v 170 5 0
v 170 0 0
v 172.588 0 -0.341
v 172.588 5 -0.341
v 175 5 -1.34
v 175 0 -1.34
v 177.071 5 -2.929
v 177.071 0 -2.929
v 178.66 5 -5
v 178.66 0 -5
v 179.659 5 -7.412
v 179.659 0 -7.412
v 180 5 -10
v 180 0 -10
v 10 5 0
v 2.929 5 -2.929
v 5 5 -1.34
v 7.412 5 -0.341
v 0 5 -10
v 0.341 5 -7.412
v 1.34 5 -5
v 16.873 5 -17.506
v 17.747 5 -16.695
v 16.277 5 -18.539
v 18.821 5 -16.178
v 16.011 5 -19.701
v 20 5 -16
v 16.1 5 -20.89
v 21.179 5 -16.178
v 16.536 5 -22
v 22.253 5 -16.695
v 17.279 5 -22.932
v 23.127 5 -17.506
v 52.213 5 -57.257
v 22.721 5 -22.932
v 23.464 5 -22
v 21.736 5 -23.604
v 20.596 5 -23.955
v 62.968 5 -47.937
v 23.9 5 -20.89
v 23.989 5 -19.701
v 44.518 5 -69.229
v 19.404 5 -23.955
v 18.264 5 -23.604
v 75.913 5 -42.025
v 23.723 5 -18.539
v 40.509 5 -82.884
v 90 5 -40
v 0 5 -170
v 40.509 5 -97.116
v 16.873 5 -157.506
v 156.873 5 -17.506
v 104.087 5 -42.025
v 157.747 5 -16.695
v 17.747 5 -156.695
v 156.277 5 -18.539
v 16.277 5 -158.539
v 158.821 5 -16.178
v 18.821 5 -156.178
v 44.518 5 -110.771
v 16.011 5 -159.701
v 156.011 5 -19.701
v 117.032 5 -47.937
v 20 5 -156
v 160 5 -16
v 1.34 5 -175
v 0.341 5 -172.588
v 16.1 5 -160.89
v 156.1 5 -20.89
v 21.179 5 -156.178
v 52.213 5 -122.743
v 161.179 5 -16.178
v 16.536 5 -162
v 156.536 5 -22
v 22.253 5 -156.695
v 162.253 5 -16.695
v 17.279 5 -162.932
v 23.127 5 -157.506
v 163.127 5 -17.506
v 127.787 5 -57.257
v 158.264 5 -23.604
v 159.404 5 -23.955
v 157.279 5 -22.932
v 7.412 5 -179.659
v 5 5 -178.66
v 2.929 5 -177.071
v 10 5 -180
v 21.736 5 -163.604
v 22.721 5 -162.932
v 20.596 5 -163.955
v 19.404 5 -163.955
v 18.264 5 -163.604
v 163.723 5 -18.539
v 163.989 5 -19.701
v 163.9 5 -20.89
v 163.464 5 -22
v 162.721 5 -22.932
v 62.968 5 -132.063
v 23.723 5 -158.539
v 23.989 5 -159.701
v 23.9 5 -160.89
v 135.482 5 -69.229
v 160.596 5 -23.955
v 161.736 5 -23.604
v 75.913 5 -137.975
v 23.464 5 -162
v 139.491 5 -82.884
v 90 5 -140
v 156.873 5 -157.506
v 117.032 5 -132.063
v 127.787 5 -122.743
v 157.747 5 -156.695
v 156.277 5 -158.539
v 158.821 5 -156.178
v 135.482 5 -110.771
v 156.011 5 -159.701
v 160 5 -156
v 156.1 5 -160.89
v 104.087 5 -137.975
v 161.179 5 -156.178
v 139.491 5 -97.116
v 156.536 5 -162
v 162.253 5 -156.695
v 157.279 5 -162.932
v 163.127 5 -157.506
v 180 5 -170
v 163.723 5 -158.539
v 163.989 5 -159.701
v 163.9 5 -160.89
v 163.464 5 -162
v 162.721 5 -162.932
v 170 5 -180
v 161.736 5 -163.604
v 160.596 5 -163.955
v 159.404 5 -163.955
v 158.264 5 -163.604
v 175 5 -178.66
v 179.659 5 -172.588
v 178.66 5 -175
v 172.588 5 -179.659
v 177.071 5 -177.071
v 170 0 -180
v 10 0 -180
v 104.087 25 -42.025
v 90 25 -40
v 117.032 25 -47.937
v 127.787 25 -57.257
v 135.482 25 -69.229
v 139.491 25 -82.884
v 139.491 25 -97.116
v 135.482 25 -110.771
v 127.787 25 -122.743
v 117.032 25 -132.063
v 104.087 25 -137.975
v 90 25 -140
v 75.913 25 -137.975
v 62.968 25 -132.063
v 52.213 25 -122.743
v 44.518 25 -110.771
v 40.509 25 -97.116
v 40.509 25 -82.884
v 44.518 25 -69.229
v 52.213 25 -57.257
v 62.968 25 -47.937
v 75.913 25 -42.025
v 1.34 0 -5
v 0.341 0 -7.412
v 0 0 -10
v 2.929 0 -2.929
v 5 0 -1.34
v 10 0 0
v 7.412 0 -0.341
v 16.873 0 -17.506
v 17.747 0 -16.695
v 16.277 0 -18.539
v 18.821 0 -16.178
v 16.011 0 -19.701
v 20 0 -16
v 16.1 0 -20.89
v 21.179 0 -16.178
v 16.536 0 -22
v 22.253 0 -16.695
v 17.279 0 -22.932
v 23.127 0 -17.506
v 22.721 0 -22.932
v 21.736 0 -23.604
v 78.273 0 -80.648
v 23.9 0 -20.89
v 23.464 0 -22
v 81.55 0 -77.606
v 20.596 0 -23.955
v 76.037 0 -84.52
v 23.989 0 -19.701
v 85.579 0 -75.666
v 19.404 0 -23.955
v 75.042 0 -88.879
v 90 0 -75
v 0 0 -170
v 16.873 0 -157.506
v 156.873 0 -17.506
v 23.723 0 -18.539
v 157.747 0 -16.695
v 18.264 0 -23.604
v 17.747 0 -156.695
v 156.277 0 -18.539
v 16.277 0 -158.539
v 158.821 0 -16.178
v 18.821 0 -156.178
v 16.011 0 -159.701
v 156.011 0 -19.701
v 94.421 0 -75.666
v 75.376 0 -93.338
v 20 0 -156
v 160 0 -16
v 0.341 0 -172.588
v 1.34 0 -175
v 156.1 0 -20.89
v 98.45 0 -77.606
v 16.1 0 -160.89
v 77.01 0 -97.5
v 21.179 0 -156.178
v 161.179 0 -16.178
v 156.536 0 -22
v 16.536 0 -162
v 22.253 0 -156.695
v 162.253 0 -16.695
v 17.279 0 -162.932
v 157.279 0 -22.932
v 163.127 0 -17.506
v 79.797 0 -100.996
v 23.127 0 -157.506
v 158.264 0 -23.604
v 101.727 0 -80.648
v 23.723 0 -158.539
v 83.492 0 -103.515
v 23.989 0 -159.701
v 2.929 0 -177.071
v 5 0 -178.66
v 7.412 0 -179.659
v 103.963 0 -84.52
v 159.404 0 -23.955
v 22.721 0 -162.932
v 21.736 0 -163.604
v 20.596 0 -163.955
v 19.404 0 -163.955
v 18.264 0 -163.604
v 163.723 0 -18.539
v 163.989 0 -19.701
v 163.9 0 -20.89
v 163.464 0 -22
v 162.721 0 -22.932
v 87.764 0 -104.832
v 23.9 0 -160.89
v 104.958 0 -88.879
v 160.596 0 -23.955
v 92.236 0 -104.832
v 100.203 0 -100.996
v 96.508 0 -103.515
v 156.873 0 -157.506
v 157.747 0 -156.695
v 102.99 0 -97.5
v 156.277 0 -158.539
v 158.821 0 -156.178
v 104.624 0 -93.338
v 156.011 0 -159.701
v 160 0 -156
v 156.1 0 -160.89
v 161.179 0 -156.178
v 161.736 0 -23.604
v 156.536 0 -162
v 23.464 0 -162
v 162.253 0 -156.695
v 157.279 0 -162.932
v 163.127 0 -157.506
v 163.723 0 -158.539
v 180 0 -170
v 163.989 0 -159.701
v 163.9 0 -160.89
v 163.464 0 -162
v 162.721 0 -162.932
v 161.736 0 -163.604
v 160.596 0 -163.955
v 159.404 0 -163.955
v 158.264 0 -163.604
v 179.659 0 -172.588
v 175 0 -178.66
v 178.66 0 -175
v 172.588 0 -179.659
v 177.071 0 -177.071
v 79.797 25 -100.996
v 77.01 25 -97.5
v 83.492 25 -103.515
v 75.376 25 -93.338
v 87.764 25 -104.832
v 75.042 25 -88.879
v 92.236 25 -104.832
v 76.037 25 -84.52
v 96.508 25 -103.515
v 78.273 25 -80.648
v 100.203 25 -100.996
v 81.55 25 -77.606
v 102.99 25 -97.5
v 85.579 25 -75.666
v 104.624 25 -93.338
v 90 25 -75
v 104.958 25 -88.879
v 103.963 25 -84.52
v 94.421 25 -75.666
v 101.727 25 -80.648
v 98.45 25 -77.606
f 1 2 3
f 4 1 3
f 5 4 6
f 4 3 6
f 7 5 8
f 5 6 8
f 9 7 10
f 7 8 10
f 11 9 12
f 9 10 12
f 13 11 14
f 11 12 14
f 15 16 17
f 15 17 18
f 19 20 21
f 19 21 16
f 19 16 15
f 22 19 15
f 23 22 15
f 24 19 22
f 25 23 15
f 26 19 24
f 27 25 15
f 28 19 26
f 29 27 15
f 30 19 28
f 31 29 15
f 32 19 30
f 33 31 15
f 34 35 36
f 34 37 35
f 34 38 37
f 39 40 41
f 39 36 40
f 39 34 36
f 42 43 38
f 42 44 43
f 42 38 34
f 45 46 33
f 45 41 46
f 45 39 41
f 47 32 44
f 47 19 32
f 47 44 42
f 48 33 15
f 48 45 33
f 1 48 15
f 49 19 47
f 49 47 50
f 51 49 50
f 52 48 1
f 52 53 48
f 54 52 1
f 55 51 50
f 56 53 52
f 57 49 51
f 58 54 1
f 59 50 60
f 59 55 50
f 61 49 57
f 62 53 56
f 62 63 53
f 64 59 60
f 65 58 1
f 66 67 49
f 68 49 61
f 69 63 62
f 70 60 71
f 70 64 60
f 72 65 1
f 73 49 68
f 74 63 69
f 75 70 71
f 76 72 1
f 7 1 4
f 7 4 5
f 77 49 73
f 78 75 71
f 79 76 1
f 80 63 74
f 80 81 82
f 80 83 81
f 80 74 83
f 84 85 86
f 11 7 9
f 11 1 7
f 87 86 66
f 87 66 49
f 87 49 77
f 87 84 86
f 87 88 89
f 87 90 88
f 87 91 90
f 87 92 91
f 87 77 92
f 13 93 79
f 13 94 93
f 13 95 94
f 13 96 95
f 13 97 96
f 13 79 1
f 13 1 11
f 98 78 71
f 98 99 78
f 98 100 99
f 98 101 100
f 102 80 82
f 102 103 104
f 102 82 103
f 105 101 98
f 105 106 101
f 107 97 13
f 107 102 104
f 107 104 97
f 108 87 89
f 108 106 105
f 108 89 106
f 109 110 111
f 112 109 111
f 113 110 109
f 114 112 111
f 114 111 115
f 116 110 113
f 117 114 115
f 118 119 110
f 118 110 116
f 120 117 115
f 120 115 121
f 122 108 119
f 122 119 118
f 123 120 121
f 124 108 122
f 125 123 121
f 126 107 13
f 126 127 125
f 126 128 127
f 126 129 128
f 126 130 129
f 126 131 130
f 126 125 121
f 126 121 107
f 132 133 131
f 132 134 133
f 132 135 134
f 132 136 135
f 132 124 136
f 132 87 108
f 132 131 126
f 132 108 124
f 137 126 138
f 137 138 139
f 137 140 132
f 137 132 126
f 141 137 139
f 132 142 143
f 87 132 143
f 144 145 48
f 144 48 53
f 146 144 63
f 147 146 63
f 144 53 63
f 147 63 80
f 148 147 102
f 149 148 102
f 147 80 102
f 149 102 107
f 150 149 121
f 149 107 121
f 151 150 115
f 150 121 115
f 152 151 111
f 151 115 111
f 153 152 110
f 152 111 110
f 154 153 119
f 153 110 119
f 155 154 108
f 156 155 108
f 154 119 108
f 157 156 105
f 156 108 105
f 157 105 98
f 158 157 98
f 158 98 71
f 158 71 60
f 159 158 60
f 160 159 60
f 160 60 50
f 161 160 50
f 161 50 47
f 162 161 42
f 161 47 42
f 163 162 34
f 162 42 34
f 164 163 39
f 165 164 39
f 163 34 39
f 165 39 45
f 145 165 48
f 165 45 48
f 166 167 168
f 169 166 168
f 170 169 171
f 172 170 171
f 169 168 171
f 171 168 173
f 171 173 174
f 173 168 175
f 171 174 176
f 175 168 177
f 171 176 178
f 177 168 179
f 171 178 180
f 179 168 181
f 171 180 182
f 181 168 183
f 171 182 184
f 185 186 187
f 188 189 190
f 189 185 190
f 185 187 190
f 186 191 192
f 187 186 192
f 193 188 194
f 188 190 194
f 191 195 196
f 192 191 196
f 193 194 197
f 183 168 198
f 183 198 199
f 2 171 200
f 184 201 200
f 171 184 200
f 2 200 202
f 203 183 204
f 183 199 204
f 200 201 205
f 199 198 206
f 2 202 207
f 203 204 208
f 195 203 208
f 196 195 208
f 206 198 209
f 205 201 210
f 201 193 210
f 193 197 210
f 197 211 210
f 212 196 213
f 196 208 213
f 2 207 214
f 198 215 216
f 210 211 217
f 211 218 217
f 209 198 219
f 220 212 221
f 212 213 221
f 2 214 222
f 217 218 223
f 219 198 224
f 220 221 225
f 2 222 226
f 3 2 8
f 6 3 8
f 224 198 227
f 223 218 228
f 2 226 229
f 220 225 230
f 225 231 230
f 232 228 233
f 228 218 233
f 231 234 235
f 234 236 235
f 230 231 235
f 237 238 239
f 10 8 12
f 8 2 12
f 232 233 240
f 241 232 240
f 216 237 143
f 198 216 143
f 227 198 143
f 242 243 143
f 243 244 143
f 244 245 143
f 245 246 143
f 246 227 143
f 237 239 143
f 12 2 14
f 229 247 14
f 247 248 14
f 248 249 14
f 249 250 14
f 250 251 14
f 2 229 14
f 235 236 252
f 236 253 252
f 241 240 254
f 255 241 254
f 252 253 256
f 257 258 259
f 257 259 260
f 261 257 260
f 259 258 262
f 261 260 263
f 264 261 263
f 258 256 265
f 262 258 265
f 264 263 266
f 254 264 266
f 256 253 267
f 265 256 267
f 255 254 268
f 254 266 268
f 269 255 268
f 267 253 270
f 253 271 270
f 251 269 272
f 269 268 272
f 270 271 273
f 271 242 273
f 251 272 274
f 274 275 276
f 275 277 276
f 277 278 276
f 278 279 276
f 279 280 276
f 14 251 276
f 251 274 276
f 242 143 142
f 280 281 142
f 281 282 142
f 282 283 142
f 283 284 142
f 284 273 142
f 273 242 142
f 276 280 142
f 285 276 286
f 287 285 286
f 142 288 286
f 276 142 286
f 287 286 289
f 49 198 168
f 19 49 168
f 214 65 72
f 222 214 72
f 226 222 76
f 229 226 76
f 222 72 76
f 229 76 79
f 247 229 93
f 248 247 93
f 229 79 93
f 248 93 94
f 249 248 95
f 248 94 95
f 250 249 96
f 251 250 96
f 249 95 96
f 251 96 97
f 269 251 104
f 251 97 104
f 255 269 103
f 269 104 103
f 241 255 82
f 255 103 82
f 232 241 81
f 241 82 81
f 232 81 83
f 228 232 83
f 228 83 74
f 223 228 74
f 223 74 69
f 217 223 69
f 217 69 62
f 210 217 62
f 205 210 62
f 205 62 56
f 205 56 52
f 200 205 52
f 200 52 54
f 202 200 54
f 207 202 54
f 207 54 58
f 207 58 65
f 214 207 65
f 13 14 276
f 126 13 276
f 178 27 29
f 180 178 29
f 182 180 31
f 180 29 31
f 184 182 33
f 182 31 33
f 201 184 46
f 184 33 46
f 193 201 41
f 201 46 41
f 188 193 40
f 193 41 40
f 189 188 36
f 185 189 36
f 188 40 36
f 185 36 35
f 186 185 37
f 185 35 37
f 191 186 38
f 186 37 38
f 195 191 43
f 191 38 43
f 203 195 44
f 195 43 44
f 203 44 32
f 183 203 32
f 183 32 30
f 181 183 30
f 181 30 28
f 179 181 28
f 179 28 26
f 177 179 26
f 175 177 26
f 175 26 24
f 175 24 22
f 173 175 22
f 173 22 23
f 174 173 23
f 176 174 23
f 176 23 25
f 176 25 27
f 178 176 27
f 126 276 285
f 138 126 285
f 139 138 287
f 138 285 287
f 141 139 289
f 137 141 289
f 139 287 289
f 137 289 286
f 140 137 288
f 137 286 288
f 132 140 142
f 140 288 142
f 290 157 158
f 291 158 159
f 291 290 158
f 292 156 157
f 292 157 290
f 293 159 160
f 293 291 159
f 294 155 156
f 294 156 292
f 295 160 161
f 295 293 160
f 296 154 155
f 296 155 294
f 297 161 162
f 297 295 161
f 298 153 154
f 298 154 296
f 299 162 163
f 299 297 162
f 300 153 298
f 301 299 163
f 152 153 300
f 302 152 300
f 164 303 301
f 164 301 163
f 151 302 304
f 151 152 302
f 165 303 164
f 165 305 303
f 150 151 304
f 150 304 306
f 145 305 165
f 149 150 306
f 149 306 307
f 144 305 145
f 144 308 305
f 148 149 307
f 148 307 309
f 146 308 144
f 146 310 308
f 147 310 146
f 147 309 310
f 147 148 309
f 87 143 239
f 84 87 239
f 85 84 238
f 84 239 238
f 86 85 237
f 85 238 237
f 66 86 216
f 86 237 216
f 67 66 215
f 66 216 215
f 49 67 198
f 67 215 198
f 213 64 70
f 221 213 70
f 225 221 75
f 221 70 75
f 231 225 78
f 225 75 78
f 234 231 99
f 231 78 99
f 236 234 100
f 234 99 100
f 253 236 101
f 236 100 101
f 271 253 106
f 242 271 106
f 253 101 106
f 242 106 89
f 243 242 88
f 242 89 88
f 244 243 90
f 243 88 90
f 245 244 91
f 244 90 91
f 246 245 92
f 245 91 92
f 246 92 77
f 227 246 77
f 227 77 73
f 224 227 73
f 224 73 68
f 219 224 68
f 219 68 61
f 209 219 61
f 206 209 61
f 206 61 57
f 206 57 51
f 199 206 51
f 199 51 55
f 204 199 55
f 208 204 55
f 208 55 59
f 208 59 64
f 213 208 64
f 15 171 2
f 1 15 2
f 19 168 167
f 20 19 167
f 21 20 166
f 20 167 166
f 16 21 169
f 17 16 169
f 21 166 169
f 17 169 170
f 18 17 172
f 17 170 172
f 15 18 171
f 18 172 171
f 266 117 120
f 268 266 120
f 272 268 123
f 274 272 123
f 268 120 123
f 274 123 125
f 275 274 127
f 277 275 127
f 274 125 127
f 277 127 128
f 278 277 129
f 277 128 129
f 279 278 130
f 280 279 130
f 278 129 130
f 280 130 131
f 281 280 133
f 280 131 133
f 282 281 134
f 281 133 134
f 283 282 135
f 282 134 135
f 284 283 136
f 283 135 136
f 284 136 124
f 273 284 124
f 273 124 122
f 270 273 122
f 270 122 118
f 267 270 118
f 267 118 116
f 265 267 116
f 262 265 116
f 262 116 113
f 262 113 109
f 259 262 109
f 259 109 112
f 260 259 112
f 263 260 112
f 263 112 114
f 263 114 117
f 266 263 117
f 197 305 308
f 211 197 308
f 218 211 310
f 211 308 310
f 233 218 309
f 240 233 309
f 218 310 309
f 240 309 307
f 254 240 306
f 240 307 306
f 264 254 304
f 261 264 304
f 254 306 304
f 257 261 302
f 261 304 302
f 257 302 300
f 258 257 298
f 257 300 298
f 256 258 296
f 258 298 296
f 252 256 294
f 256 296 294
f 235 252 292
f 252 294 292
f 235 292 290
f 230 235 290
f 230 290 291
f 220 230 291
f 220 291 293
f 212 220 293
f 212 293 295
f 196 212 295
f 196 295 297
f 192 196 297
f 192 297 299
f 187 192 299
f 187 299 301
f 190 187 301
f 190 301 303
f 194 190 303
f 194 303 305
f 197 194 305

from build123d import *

# Parameters (mm, degrees)
BOSS_EXTRUDE1_DEPTH  = 5
SKETCH2_R            = 4
CUT_EXTRUDE1_DEPTH   = 10
LPATTERN1_COUNT      = 2
LPATTERN1_PITCH      = 140
LPATTERN1_COUNT_DIR2 = 2
LPATTERN1_PITCH_DIR2 = 140
SKETCH3_R            = 50
BOSS_EXTRUDE2_DEPTH  = 20
SKETCH5_R            = 15
CUT_EXTRUDE3_DEPTH   = 50


with BuildPart() as part:
    # Sketch1 → Boss-Extrude1 (new body)
    with BuildSketch(Plane(origin=(0, 0, 0), x_dir=(1, 0, 0), z_dir=(0, 1, 0))):
        with BuildLine():
            Line((10, 0), (170, 0))
            ThreePointArc((170, 0), (177.071067812, 2.928932188), (180, 10))
            Line((180, 10), (180, 170))
            ThreePointArc((180, 170), (177.071067812, 177.071067812), (170, 180))
            Line((170, 180), (10, 180))
            ThreePointArc((10, 180), (2.928932188, 177.071067812), (0, 170))
            Line((0, 170), (0, 10))
            ThreePointArc((0, 10), (2.928932188, 2.928932188), (10, 0))
        make_face()
    extrude(amount=BOSS_EXTRUDE1_DEPTH)

    # Sketch2 → Cut-Extrude1 (cut)
    with BuildSketch(Plane(origin=(0, 5, 0), x_dir=(1, 0, 0), z_dir=(0, 1, 0))):
        with Locations(Location((20, 20, 0), (0, 0, 270))):
            Circle(SKETCH2_R)
    cut_extrude1 = extrude(amount=-CUT_EXTRUDE1_DEPTH, mode=Mode.SUBTRACT)

    # LPattern1: Cut-Extrude1 2 × 2
    with Locations(*[(i * LPATTERN1_PITCH, 0, -j * LPATTERN1_PITCH_DIR2) for i in range(LPATTERN1_COUNT) for j in range(LPATTERN1_COUNT_DIR2) if (i, j) != (0, 0)]):
        add(cut_extrude1, mode=Mode.SUBTRACT)

    # Sketch3 → Boss-Extrude2 (add)
    with BuildSketch(Plane(origin=(0, 5, 0), x_dir=(1, 0, 0), z_dir=(0, 1, 0))):
        with Locations(Location((90, 90, 0), (0, 0, 270))):
            Circle(SKETCH3_R)
    extrude(amount=BOSS_EXTRUDE2_DEPTH)

    # Sketch5 → Cut-Extrude3 (cut)
    with BuildSketch(Plane(origin=(0, 25, 0), x_dir=(1, 0, 0), z_dir=(0, 1, 0))):
        with Locations(Location((90, 90, 0), (0, 0, 270))):
            Circle(SKETCH5_R)
    extrude(amount=-CUT_EXTRUDE3_DEPTH, mode=Mode.SUBTRACT)


solid = part.part
